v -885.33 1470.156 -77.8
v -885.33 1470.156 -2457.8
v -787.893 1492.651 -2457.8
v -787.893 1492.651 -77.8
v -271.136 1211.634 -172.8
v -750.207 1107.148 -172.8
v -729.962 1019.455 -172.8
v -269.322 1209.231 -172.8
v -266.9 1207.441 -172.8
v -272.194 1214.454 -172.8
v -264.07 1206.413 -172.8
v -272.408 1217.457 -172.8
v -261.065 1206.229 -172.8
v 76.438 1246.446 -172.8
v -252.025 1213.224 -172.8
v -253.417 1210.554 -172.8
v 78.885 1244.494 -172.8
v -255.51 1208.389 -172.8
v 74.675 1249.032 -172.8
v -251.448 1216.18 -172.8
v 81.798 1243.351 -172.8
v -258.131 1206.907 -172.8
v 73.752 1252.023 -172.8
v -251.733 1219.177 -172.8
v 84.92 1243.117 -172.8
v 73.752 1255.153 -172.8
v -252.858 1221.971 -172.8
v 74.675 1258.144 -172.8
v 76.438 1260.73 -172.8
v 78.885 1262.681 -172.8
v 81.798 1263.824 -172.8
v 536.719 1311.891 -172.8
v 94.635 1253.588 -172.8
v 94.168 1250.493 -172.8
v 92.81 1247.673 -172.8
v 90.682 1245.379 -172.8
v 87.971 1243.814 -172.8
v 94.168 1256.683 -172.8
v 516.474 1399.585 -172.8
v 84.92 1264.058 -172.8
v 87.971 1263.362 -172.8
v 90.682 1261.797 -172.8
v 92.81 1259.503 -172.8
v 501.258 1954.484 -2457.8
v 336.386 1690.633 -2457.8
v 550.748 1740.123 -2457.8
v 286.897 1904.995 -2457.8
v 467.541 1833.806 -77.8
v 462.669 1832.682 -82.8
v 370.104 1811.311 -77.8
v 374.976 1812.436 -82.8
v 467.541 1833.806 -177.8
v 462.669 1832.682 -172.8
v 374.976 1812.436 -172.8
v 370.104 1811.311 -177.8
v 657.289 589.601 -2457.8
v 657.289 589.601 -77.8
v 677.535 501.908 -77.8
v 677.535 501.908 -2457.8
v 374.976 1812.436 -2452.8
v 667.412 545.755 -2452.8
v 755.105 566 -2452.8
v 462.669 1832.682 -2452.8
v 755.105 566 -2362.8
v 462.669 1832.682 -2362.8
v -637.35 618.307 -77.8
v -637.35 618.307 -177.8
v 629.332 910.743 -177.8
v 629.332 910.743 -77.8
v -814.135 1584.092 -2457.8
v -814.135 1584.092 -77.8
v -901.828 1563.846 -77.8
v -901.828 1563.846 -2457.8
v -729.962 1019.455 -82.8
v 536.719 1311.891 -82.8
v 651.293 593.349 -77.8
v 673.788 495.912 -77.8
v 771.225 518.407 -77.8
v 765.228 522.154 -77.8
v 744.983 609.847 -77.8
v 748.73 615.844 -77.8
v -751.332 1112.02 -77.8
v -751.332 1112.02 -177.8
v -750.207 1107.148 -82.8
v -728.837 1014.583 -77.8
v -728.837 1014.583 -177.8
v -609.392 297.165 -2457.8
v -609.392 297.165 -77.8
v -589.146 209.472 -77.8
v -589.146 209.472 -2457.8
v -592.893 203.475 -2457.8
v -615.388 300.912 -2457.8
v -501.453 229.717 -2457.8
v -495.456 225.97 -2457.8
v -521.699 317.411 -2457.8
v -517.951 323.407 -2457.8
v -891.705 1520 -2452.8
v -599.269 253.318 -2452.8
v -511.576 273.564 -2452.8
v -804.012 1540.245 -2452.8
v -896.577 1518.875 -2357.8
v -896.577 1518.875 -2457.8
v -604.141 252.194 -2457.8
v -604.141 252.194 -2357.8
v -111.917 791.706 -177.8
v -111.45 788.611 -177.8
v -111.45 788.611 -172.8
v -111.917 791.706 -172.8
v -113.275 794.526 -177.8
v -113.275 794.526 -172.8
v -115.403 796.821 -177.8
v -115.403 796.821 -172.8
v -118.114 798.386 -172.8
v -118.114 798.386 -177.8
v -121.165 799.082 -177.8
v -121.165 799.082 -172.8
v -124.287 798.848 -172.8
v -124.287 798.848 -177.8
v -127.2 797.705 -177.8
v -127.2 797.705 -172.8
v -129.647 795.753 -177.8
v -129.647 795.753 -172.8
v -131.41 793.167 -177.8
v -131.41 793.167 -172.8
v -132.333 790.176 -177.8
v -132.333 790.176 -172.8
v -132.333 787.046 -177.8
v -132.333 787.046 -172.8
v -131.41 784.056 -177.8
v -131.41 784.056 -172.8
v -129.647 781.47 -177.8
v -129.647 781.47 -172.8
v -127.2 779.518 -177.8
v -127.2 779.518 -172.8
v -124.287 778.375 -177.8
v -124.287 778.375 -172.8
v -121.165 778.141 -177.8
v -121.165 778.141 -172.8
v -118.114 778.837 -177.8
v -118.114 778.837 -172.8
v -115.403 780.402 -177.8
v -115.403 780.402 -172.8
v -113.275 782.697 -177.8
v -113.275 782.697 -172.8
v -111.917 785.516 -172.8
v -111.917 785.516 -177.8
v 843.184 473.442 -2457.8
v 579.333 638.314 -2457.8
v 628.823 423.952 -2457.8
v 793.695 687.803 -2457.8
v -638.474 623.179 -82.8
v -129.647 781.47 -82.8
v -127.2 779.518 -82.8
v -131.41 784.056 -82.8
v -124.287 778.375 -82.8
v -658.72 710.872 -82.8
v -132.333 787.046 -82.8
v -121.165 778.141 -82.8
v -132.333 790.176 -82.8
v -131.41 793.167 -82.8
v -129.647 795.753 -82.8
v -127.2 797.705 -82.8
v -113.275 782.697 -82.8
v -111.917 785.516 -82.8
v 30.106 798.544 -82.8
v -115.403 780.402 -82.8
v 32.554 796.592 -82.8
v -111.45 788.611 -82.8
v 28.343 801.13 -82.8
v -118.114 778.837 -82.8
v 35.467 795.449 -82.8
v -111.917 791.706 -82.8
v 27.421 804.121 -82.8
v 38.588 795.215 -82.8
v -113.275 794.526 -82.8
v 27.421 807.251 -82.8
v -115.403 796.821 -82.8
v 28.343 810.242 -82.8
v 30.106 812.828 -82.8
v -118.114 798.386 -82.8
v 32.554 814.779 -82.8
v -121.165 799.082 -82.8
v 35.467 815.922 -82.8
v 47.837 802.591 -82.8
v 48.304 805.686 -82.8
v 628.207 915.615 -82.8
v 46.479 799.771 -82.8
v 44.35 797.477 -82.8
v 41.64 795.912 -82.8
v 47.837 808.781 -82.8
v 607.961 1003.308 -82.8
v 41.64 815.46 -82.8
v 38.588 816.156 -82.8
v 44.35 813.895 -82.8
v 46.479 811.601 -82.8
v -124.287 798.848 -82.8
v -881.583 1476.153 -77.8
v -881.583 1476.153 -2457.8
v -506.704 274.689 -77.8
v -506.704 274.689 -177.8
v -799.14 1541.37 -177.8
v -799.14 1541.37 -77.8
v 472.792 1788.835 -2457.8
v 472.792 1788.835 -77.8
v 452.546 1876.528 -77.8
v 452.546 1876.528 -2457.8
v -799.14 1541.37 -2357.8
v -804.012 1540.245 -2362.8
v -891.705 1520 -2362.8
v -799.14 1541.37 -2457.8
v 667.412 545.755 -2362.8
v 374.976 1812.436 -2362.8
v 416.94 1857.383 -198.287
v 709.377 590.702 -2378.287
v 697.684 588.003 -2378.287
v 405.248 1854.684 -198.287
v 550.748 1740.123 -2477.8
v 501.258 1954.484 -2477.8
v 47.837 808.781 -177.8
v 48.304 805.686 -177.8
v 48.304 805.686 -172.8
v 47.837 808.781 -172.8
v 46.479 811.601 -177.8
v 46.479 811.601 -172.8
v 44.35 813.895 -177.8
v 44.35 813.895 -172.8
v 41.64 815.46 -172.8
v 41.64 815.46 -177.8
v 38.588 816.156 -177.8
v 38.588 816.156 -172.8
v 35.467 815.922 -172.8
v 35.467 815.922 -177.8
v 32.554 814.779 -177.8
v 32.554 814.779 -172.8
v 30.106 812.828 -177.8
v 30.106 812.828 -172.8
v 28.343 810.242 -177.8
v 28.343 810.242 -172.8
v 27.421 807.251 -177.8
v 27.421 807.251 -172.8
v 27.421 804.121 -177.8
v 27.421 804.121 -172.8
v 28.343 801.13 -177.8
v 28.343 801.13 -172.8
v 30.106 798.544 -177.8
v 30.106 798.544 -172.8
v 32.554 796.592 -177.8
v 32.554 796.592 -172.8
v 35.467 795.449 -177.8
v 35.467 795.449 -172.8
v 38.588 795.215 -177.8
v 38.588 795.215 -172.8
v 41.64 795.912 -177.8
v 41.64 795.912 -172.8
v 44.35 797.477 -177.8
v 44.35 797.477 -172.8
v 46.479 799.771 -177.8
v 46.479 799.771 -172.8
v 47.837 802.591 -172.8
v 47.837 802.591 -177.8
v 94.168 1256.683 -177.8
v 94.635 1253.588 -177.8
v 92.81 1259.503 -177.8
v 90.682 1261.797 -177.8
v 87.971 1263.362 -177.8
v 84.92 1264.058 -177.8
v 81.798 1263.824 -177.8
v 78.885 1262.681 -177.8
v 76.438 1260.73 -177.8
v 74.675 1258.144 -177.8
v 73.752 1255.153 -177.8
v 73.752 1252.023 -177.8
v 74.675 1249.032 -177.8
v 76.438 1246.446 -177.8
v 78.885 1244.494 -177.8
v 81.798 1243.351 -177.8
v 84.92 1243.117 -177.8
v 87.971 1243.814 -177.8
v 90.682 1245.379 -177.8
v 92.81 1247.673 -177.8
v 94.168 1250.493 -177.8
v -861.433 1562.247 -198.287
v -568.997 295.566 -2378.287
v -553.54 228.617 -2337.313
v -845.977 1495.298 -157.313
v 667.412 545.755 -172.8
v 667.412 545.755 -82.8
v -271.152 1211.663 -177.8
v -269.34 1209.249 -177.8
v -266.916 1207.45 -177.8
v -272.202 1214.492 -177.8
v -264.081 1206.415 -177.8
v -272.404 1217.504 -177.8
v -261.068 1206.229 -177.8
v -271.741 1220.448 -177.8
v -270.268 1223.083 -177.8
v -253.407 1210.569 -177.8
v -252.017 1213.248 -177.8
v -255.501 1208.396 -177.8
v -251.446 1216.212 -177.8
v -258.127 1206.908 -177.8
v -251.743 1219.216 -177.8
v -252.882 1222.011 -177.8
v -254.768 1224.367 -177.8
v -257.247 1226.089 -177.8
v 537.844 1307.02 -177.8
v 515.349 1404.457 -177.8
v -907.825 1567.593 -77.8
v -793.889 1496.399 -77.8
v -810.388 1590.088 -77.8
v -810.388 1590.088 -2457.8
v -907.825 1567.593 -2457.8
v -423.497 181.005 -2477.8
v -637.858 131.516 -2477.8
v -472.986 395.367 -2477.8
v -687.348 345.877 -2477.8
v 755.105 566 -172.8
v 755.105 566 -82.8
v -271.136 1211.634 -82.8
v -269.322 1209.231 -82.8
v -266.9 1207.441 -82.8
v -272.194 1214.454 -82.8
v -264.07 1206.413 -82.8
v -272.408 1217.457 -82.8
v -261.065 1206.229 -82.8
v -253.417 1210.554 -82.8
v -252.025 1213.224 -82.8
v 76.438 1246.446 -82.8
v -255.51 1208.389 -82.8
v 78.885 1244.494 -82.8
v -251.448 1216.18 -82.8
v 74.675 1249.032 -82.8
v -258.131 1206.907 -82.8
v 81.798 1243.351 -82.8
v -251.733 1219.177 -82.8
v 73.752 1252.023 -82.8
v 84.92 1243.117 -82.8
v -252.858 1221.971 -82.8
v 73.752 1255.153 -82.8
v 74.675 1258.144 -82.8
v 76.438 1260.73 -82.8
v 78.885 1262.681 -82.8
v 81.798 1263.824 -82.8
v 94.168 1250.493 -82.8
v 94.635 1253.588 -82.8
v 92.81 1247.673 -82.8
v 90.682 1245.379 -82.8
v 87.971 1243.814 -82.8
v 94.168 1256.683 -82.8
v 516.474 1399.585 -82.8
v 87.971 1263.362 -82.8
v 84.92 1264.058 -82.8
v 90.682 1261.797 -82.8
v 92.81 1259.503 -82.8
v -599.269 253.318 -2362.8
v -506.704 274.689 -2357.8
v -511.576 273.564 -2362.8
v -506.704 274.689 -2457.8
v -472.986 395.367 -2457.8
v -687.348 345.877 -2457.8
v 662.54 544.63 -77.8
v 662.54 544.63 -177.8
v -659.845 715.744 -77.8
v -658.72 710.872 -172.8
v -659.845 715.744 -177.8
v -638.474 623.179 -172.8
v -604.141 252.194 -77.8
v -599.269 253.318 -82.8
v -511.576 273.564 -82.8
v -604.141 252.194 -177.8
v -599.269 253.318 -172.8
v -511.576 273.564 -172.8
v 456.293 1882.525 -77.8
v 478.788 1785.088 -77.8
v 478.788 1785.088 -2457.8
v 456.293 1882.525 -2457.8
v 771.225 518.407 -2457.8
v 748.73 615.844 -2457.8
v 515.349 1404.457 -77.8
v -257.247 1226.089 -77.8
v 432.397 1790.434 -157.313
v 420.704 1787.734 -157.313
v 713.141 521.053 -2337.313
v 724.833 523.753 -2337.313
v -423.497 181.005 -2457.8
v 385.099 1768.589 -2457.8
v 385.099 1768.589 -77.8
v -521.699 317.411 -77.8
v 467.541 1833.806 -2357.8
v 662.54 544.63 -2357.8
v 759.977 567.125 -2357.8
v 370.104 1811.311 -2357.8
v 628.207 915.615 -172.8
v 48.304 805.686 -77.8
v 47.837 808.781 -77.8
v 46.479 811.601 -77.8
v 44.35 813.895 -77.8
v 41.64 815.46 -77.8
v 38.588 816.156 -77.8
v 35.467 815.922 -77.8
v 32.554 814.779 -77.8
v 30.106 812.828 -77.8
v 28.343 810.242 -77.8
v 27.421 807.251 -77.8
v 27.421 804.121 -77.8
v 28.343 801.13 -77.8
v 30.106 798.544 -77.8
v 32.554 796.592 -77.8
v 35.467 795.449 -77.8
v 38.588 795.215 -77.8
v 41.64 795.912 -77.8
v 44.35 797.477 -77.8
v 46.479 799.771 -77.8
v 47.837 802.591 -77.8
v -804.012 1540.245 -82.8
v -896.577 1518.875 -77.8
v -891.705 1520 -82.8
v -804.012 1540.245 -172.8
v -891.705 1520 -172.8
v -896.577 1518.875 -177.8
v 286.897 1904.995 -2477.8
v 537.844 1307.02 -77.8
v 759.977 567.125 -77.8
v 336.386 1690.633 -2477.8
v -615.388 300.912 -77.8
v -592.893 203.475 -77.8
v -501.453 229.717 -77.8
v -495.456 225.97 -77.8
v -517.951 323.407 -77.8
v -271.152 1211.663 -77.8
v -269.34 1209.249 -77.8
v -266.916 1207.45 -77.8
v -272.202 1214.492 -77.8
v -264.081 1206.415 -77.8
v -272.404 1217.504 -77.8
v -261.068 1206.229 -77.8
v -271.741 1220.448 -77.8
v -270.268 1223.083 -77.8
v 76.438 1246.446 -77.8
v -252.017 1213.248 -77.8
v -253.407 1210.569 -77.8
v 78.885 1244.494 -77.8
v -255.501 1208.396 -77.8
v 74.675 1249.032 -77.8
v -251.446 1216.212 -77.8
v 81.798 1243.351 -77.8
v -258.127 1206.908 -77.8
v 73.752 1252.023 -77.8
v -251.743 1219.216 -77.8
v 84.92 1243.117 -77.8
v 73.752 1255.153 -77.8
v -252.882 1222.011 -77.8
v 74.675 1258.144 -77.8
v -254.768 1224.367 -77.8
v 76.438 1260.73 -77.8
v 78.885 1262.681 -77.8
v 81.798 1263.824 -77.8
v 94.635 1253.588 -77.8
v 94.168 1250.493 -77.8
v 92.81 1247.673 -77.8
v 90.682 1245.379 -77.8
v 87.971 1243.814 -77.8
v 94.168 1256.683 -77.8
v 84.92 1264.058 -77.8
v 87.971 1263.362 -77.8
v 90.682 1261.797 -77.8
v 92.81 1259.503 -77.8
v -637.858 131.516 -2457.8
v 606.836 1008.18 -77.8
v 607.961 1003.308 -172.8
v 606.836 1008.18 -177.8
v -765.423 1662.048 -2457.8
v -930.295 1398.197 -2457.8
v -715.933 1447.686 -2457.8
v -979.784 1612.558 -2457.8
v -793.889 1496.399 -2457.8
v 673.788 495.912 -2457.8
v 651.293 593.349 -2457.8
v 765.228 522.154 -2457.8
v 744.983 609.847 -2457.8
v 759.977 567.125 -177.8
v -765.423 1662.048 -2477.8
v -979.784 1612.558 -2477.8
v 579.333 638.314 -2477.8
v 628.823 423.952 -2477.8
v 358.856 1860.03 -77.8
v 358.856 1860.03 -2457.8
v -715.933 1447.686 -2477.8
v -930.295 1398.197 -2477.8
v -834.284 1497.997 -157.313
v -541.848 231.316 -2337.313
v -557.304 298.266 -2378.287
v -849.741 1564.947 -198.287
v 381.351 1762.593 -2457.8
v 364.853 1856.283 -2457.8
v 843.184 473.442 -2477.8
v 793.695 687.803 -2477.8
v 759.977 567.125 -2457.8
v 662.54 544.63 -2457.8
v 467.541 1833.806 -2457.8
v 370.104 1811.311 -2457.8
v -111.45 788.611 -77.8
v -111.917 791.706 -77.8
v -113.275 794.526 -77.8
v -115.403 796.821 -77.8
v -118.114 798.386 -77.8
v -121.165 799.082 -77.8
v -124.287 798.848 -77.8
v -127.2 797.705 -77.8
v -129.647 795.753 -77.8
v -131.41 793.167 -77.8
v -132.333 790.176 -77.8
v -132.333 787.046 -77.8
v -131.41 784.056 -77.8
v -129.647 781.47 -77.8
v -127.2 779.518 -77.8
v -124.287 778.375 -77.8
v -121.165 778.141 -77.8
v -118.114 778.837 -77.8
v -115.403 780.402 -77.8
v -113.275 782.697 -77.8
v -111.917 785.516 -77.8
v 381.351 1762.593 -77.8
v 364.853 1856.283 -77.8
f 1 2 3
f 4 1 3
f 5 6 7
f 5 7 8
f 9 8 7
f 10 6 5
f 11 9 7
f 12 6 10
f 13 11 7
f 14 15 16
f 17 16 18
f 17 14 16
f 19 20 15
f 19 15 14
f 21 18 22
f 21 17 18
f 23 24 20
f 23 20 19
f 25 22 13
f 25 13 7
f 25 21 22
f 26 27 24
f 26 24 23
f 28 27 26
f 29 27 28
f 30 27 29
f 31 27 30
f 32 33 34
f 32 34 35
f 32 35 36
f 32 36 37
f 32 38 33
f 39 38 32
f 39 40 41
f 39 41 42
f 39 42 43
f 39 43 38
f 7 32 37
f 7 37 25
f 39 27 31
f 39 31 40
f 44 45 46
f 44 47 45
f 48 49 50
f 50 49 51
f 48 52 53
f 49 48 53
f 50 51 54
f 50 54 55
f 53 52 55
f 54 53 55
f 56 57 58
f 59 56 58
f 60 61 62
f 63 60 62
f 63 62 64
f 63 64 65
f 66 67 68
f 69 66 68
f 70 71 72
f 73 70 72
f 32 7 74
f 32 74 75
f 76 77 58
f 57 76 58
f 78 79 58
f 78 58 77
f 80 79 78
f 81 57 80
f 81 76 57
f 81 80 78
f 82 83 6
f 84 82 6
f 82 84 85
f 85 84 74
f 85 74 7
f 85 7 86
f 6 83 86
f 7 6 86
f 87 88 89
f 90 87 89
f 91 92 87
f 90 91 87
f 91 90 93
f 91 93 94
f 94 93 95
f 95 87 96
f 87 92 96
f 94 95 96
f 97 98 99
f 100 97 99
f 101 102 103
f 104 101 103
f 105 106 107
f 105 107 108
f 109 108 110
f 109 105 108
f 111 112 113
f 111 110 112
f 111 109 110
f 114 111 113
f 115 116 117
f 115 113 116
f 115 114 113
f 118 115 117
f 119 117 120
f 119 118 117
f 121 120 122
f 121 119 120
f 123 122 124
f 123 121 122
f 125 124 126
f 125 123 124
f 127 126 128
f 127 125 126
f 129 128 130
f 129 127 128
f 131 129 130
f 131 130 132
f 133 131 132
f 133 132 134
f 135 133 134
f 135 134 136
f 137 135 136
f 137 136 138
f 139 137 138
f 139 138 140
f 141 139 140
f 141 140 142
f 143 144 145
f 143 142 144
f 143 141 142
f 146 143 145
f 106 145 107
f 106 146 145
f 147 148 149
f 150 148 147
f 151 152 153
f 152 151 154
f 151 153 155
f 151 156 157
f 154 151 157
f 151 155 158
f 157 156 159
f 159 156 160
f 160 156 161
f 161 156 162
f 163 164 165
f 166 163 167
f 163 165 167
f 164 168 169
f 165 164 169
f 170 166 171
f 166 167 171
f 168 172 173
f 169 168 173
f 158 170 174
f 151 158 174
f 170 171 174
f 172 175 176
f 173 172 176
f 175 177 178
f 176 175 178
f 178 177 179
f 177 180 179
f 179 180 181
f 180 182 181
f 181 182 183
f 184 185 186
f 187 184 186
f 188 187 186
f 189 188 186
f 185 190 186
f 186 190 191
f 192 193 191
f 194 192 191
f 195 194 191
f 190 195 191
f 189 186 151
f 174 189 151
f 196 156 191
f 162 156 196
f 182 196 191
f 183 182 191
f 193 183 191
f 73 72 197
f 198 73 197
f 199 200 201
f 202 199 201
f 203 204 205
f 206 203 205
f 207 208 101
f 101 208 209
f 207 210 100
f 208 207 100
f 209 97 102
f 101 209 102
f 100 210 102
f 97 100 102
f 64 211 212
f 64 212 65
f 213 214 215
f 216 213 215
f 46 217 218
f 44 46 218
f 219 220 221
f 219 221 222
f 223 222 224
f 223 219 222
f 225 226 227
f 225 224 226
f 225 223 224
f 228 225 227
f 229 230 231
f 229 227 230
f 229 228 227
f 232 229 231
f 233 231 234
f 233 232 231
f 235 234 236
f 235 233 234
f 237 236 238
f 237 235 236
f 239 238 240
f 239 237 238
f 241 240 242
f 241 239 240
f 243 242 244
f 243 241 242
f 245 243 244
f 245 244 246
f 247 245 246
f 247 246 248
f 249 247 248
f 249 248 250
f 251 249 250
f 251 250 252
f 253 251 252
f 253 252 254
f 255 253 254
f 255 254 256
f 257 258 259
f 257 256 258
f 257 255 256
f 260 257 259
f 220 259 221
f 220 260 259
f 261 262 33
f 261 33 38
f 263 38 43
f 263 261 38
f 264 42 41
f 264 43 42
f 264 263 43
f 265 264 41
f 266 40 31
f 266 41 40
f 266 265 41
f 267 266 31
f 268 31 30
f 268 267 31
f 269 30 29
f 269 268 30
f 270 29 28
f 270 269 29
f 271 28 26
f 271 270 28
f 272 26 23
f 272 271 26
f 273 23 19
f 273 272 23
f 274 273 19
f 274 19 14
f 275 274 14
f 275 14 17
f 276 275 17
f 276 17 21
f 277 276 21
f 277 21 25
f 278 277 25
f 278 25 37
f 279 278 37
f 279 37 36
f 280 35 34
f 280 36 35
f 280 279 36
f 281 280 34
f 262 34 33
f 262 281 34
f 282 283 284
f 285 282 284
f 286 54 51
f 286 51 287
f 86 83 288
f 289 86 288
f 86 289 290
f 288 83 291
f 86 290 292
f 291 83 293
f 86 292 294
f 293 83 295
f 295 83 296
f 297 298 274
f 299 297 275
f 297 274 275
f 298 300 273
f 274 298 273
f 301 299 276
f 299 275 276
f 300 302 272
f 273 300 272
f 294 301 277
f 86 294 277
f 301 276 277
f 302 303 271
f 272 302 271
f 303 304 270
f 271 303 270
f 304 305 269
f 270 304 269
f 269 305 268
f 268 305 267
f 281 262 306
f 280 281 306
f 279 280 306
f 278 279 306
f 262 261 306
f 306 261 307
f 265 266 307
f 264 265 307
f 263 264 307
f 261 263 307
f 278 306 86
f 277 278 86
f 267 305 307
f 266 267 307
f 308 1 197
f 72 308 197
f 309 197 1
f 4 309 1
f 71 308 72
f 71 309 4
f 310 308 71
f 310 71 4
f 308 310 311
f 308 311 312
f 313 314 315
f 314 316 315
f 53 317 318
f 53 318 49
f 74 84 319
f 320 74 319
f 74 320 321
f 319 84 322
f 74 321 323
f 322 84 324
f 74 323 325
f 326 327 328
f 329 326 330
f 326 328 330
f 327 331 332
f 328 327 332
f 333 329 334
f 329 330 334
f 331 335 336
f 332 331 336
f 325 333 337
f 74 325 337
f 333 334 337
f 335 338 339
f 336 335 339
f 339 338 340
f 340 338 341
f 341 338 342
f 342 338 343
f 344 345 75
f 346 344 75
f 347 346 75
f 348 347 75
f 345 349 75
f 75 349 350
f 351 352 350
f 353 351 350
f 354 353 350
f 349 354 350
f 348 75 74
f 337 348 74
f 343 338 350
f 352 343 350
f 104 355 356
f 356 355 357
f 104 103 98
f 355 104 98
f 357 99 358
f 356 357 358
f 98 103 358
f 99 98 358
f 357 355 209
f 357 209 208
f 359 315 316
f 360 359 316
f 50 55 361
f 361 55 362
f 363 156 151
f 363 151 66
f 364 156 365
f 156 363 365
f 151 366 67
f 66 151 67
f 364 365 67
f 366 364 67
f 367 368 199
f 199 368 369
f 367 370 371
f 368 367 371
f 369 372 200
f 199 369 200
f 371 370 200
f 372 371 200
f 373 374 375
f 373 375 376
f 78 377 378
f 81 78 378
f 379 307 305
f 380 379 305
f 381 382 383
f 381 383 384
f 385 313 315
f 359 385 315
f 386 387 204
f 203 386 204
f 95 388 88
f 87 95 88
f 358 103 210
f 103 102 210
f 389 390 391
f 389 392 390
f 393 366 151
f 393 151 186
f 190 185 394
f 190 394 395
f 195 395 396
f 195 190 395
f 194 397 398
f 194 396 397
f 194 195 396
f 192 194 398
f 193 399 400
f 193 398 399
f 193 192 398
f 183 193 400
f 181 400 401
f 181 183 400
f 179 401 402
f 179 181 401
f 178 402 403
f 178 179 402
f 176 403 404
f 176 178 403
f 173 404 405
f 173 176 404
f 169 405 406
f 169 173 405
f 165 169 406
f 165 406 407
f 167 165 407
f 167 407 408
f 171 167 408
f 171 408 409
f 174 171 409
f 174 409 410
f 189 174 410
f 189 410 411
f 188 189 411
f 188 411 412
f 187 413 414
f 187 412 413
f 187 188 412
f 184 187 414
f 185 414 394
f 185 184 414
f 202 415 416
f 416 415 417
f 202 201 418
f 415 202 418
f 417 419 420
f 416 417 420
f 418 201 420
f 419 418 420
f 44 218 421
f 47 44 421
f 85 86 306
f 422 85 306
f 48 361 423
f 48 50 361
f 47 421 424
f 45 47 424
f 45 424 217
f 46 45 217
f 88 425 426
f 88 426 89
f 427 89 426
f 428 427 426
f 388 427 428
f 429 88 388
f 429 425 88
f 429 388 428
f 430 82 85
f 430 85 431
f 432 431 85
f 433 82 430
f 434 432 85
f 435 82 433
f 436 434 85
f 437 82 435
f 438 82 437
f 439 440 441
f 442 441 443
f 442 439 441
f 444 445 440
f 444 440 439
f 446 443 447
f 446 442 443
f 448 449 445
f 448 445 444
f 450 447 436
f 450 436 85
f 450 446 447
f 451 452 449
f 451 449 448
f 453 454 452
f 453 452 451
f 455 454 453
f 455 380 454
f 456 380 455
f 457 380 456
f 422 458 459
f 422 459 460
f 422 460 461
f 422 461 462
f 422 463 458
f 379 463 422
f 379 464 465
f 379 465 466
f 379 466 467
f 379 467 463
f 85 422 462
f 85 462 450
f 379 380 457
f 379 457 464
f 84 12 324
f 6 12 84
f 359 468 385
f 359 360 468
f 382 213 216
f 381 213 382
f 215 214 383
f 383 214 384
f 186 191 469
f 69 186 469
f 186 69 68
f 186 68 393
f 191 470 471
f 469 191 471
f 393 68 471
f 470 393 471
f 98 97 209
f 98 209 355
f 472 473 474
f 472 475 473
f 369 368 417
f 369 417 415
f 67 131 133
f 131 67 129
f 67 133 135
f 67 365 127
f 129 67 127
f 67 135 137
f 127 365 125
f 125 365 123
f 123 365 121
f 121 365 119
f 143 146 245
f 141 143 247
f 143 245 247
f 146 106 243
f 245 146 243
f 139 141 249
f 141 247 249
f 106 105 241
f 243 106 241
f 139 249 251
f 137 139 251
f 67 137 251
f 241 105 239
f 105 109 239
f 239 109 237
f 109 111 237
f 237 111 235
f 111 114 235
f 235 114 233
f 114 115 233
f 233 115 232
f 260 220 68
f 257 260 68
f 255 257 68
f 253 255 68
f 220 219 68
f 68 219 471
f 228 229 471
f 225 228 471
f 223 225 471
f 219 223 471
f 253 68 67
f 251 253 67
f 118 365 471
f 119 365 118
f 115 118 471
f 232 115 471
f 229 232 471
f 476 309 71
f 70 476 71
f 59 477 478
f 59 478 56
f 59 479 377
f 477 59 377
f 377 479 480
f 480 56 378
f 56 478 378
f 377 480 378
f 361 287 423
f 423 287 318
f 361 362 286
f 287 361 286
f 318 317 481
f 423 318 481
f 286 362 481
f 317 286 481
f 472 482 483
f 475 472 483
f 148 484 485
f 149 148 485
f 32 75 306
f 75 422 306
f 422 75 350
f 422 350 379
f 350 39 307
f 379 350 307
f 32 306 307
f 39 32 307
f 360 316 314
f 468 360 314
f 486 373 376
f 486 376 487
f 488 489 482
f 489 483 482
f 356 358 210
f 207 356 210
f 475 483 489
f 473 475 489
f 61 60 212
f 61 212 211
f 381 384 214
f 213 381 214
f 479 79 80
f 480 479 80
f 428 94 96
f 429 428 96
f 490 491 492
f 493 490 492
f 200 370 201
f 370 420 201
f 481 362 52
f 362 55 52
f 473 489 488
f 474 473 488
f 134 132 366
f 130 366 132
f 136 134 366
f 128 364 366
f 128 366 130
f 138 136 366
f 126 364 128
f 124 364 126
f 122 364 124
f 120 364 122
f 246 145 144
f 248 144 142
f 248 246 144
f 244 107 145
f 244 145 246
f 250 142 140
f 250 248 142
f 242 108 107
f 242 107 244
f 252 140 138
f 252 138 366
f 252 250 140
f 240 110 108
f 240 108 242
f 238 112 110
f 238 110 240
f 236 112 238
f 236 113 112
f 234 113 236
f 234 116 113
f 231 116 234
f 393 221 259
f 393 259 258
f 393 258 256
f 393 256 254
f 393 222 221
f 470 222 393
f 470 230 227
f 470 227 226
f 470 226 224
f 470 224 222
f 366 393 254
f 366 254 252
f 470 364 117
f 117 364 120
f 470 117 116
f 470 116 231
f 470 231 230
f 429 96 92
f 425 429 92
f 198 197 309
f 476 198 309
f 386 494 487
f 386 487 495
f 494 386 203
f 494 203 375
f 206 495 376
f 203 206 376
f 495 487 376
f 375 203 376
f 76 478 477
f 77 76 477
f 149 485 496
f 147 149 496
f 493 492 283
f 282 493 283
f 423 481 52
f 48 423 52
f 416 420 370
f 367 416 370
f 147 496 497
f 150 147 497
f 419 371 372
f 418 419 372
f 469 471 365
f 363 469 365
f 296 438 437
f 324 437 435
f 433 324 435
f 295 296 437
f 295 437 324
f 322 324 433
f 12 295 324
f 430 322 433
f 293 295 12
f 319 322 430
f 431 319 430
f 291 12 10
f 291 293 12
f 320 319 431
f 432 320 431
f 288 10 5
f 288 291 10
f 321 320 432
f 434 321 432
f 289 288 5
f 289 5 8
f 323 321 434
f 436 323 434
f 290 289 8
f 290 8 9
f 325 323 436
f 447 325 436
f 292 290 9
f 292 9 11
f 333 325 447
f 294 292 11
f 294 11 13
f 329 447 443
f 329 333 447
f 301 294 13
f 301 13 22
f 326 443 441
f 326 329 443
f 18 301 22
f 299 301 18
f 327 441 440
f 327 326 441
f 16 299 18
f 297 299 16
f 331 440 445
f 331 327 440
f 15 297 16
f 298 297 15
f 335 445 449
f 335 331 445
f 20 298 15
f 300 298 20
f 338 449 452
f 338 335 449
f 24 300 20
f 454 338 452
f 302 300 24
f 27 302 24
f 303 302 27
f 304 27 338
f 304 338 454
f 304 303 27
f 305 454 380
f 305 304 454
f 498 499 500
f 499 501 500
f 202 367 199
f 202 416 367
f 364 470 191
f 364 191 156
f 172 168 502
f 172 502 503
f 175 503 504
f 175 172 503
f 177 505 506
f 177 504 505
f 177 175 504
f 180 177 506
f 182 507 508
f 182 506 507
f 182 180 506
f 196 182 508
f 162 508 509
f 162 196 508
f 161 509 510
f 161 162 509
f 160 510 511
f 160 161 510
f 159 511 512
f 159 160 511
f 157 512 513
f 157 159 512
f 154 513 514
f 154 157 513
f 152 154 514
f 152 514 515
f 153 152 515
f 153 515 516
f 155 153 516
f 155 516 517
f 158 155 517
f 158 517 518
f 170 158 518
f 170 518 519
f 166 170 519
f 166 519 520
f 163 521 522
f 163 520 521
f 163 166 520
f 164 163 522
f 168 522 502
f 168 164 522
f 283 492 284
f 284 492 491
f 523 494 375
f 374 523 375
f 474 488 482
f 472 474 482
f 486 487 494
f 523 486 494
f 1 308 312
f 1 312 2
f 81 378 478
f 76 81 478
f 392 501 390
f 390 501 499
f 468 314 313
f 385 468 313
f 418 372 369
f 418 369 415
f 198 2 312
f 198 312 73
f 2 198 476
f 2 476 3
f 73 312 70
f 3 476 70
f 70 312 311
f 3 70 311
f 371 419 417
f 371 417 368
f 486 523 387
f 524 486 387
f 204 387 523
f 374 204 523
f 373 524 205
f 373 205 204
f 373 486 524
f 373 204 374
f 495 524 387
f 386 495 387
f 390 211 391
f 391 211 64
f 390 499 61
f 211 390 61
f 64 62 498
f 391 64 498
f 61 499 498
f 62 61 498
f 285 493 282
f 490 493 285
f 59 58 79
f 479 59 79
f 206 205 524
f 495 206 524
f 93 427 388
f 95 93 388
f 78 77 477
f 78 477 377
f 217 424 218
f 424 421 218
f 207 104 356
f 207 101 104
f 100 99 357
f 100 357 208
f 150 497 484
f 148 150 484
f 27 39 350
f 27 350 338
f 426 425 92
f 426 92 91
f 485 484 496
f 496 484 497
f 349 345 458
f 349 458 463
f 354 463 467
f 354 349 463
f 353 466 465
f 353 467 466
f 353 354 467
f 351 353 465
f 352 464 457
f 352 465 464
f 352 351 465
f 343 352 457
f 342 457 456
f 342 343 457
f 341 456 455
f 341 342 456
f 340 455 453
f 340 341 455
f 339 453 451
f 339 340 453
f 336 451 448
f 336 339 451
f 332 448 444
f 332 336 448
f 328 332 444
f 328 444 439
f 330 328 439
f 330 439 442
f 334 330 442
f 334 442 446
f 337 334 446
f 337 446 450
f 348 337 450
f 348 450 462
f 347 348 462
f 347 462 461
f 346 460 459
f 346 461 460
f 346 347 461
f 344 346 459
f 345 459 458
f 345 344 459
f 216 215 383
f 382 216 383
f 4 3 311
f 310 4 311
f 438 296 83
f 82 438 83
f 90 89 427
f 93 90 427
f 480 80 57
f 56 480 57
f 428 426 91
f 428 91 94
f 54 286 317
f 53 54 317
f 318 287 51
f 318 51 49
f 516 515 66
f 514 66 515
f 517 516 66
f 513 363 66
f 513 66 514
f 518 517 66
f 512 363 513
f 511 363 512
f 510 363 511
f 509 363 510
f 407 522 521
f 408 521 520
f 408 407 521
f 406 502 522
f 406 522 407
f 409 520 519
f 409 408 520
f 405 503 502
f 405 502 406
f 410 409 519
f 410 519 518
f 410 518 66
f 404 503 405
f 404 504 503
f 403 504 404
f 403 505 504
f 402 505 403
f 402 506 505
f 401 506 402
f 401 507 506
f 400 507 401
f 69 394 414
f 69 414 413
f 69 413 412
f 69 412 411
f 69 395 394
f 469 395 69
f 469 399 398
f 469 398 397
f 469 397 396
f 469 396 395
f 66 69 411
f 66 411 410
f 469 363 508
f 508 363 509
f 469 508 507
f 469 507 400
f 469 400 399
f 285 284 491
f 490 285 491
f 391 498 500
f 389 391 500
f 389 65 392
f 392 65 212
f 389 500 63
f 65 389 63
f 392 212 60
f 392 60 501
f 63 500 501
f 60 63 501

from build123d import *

# Parameters (mm, degrees)
BOSS_EXTRUDE1_START  = -2457.8
BOSS_EXTRUDE1_DEPTH  = 2380
BOSS_EXTRUDE2_START  = -2457.8
BOSS_EXTRUDE2_DEPTH  = 2380
BOSS_EXTRUDE3_START  = -2457.8
BOSS_EXTRUDE3_DEPTH  = 2380
BOSS_EXTRUDE4_START  = -2457.8
BOSS_EXTRUDE4_DEPTH  = 2380
BOSS_EXTRUDE5_START  = -2477.8
BOSS_EXTRUDE5_DEPTH  = 20
BOSS_EXTRUDE6_START  = -2477.8
BOSS_EXTRUDE6_DEPTH  = 20
BOSS_EXTRUDE7_START  = -2477.8
BOSS_EXTRUDE7_DEPTH  = 20
BOSS_EXTRUDE8_START  = -2477.8
BOSS_EXTRUDE8_DEPTH  = 20
BOSS_EXTRUDE9_START  = -177.8
BOSS_EXTRUDE9_DEPTH  = 100
BOSS_EXTRUDE10_START = -172.8
BOSS_EXTRUDE10_DEPTH = 90
BOSS_EXTRUDE11_START = -177.8
BOSS_EXTRUDE11_DEPTH = 100
BOSS_EXTRUDE12_START = -172.8
BOSS_EXTRUDE12_DEPTH = 90
BOSS_EXTRUDE13_START = -2457.8
BOSS_EXTRUDE13_DEPTH = 100
BOSS_EXTRUDE14_START = -2452.8
BOSS_EXTRUDE14_DEPTH = 90
BOSS_EXTRUDE15_START = -2457.8
BOSS_EXTRUDE15_DEPTH = 100
BOSS_EXTRUDE16_START = -2452.8
BOSS_EXTRUDE16_DEPTH = 90
BOSS_EXTRUDE17_START = -177.8
BOSS_EXTRUDE17_DEPTH = 100
BOSS_EXTRUDE18_START = -172.8
BOSS_EXTRUDE18_DEPTH = 90
BOSS_EXTRUDE19_START = -177.8
BOSS_EXTRUDE19_DEPTH = 100
BOSS_EXTRUDE20_START = -172.8
BOSS_EXTRUDE20_DEPTH = 90
BOSS_EXTRUDE21_START = -182.8
SKETCH21_R           = 10.5
BOSS_EXTRUDE21_DEPTH = 110
BOSS_EXTRUDE22_START = -182.8
SKETCH22_R           = 10.5
BOSS_EXTRUDE22_DEPTH = 110
BOSS_EXTRUDE23_START = -182.8
SKETCH23_R           = 10.5
BOSS_EXTRUDE23_DEPTH = 110
BOSS_EXTRUDE24_START = -182.8
SKETCH24_R           = 10.5
BOSS_EXTRUDE24_DEPTH = 110
BOSS_EXTRUDE25_DEPTH = 2538.188330286
BOSS_EXTRUDE26_DEPTH = 2538.188330286


with BuildPart() as part:
    # Sketch1 → Boss-Extrude1 (new body)
    with BuildSketch(Plane.XY.offset(BOSS_EXTRUDE1_START)):
        Polygon((381.351406265, 1762.592671477), (478.788412743, 1785.087776912), (456.293307309, 1882.52478339), (358.85630083, 1860.029677956), align=None)
        Polygon((385.098501317, 1768.589277073), (472.791807148, 1788.834871964), (452.546212257, 1876.528177795), (364.852906426, 1856.282582904), align=None, mode=Mode.SUBTRACT)
    extrude(amount=BOSS_EXTRUDE1_DEPTH)


with BuildPart() as body_2:
    # Sketch2 → Boss-Extrude2 (new body)
    with BuildSketch(Plane.XY.offset(BOSS_EXTRUDE2_START)):
        Polygon((673.787776912, 495.911587257), (771.22478339, 518.406692691), (748.729677956, 615.84369917), (651.292671477, 593.348593735), align=None)
        Polygon((677.534871964, 501.908192852), (765.228177795, 522.153787743), (744.982582904, 609.847093574), (657.289277073, 589.601498683), align=None, mode=Mode.SUBTRACT)
    extrude(amount=BOSS_EXTRUDE2_DEPTH)


with BuildPart() as body_3:
    # Sketch3 → Boss-Extrude3 (new body)
    with BuildSketch(Plane.XY.offset(BOSS_EXTRUDE3_START)):
        Polygon((-885.329677956, 1470.15630083), (-787.892671477, 1492.651406265), (-810.387776912, 1590.088412743), (-907.82478339, 1567.593307309), align=None)
        Polygon((-881.582582904, 1476.152906426), (-793.889277073, 1496.398501317), (-814.134871964, 1584.091807148), (-901.828177795, 1563.846212257), align=None, mode=Mode.SUBTRACT)
    extrude(amount=BOSS_EXTRUDE3_DEPTH)


with BuildPart() as body_4:
    # Sketch4 → Boss-Extrude4 (new body)
    with BuildSketch(Plane.XY.offset(BOSS_EXTRUDE4_START)):
        Polygon((-592.893307309, 203.47521661), (-495.45630083, 225.970322044), (-517.951406265, 323.407328523), (-615.388412743, 300.912223088), align=None)
        Polygon((-589.146212257, 209.471822205), (-501.452906426, 229.717417096), (-521.698501317, 317.410722927), (-609.391807148, 297.165128036), align=None, mode=Mode.SUBTRACT)
    extrude(amount=BOSS_EXTRUDE4_DEPTH)


with BuildPart() as body_5:
    # Sketch5 → Boss-Extrude5 (new body)
    with BuildSketch(Plane.XY.offset(BOSS_EXTRUDE5_START)):
        Polygon((336.386265638, 1690.63340433), (550.747679891, 1740.122636285), (501.258447935, 1954.484050538), (286.897033683, 1904.994818582), align=None)
    extrude(amount=BOSS_EXTRUDE5_DEPTH)


with BuildPart() as body_6:
    # Sketch6 → Boss-Extrude6 (new body)
    with BuildSketch(Plane.XY.offset(BOSS_EXTRUDE6_START)):
        Polygon((628.822636285, 423.952320109), (843.184050538, 473.441552065), (793.694818582, 687.802966317), (579.33340433, 638.313734362), align=None)
    extrude(amount=BOSS_EXTRUDE6_DEPTH)


with BuildPart() as body_7:
    # Sketch7 → Boss-Extrude7 (new body)
    with BuildSketch(Plane.XY.offset(BOSS_EXTRUDE7_START)):
        Polygon((-930.294818582, 1398.197033683), (-715.93340433, 1447.686265638), (-765.422636285, 1662.047679891), (-979.784050538, 1612.558447935), align=None)
    extrude(amount=BOSS_EXTRUDE7_DEPTH)


with BuildPart() as body_8:
    # Sketch8 → Boss-Extrude8 (new body)
    with BuildSketch(Plane.XY.offset(BOSS_EXTRUDE8_START)):
        Polygon((-637.858447935, 131.515949462), (-423.497033683, 181.005181418), (-472.986265638, 395.36659567), (-687.347679891, 345.877363715), align=None)
    extrude(amount=BOSS_EXTRUDE8_DEPTH)


with BuildPart() as body_9:
    # Sketch9 → Boss-Extrude9 (new body)
    with BuildSketch(Plane.XY.offset(BOSS_EXTRUDE9_START)):
        Polygon((662.540224195, 544.630090496), (759.977230673, 567.12519593), (467.540860026, 1833.806280151), (370.103853548, 1811.311174717), align=None)
    extrude(amount=BOSS_EXTRUDE9_DEPTH)


with BuildPart() as body_10:
    # Sketch10 → Boss-Extrude10 (new body)
    with BuildSketch(Plane.XY.offset(BOSS_EXTRUDE10_START)):
        Polygon((667.412074519, 545.754845768), (755.105380349, 566.000440659), (462.669009702, 1832.681524879), (374.975703872, 1812.435929988), align=None)
    extrude(amount=BOSS_EXTRUDE10_DEPTH)


with BuildPart() as body_9_1:
    add(body_9.part)

    # Combine1: cut body 10
    add(body_10.part, mode=Mode.SUBTRACT)


with BuildPart() as body_10_2:
    # Sketch11 → Boss-Extrude11 (new body)
    with BuildSketch(Plane.XY.offset(BOSS_EXTRUDE11_START)):
        Polygon((-604.140860026, 252.193719849), (-506.703853548, 274.688825283), (-799.140224195, 1541.369909504), (-896.577230673, 1518.87480407), align=None)
    extrude(amount=BOSS_EXTRUDE11_DEPTH)


with BuildPart() as body_11:
    # Sketch12 → Boss-Extrude12 (new body)
    with BuildSketch(Plane.XY.offset(BOSS_EXTRUDE12_START)):
        Polygon((-599.269009702, 253.318475121), (-511.575703872, 273.564070012), (-804.012074519, 1540.245154232), (-891.705380349, 1519.999559341), align=None)
    extrude(amount=BOSS_EXTRUDE12_DEPTH)


with BuildPart() as body_10_2_1:
    add(body_10_2.part)

    # Combine2: cut body 11
    add(body_11.part, mode=Mode.SUBTRACT)


with BuildPart() as body_11_2:
    # Sketch13 → Boss-Extrude13 (new body)
    with BuildSketch(Plane.XY.offset(BOSS_EXTRUDE13_START)):
        Polygon((662.540224195, 544.630090496), (759.977230673, 567.12519593), (467.540860026, 1833.806280151), (370.103853548, 1811.311174717), align=None)
    extrude(amount=BOSS_EXTRUDE13_DEPTH)


with BuildPart() as body_12:
    # Sketch14 → Boss-Extrude14 (new body)
    with BuildSketch(Plane.XY.offset(BOSS_EXTRUDE14_START)):
        Polygon((667.412074519, 545.754845768), (755.105380349, 566.000440659), (462.669009702, 1832.681524879), (374.975703872, 1812.435929988), align=None)
    extrude(amount=BOSS_EXTRUDE14_DEPTH)


with BuildPart() as body_11_2_1:
    add(body_11_2.part)

    # Combine3: cut body 12
    add(body_12.part, mode=Mode.SUBTRACT)


with BuildPart() as body_12_2:
    # Sketch15 → Boss-Extrude15 (new body)
    with BuildSketch(Plane.XY.offset(BOSS_EXTRUDE15_START)):
        Polygon((-604.140860026, 252.193719849), (-506.703853548, 274.688825283), (-799.140224195, 1541.369909504), (-896.577230673, 1518.87480407), align=None)
    extrude(amount=BOSS_EXTRUDE15_DEPTH)


with BuildPart() as body_13:
    # Sketch16 → Boss-Extrude16 (new body)
    with BuildSketch(Plane.XY.offset(BOSS_EXTRUDE16_START)):
        Polygon((-599.269009702, 253.318475121), (-511.575703872, 273.564070012), (-804.012074519, 1540.245154232), (-891.705380349, 1519.999559341), align=None)
    extrude(amount=BOSS_EXTRUDE16_DEPTH)


with BuildPart() as body_12_2_1:
    add(body_12_2.part)

    # Combine4: cut body 13
    add(body_13.part, mode=Mode.SUBTRACT)


with BuildPart() as body_13_2:
    # Sketch17 → Boss-Extrude17 (new body)
    with BuildSketch(Plane.XY.offset(BOSS_EXTRUDE17_START)):
        Polygon((-637.349530779, 618.306850161), (629.331553442, 910.743220808), (606.836448007, 1008.180227286), (-659.844636213, 715.743856639), align=None)
    extrude(amount=BOSS_EXTRUDE17_DEPTH)


with BuildPart() as body_14:
    # Sketch18 → Boss-Extrude18 (new body)
    with BuildSketch(Plane.XY.offset(BOSS_EXTRUDE18_START)):
        Polygon((-638.474286051, 623.178700485), (628.20679817, 915.615071132), (607.961203279, 1003.308376962), (-658.719880942, 710.872006315), align=None)
    extrude(amount=BOSS_EXTRUDE18_DEPTH)


with BuildPart() as body_13_2_1:
    add(body_13_2.part)

    # Combine5: cut body 14
    add(body_14.part, mode=Mode.SUBTRACT)


with BuildPart() as body_14_2:
    # Sketch19 → Boss-Extrude19 (new body)
    with BuildSketch(Plane.XY.offset(BOSS_EXTRUDE19_START)):
        Polygon((-728.837124581, 1014.583155509), (537.84395964, 1307.019526156), (515.348854206, 1404.456532635), (-751.332230015, 1112.020161988), align=None)
    extrude(amount=BOSS_EXTRUDE19_DEPTH)


with BuildPart() as body_15:
    # Sketch20 → Boss-Extrude20 (new body)
    with BuildSketch(Plane.XY.offset(BOSS_EXTRUDE20_START)):
        Polygon((-729.961879852, 1019.455005833), (536.719204369, 1311.89137648), (516.473609478, 1399.584682311), (-750.207474743, 1107.148311664), align=None)
    extrude(amount=BOSS_EXTRUDE20_DEPTH)


with BuildPart() as body_14_2_1:
    add(body_14_2.part)

    # Combine6: cut body 15
    add(body_15.part, mode=Mode.SUBTRACT)


with BuildPart() as body_15_2:
    # Sketch21 → Boss-Extrude21 (new body)
    with BuildSketch(Plane.XY.offset(BOSS_EXTRUDE21_START)):
        with Locations((-121.95006348, 788.611398273)):
            Circle(SKETCH21_R)
    extrude(amount=BOSS_EXTRUDE21_DEPTH)


with BuildPart() as body_13_2_2:
    add(body_13_2_1.part)

    # Combine7: cut body 15 2
    add(body_15_2.part, mode=Mode.SUBTRACT)


with BuildPart() as body_15_3:
    # Sketch22 → Boss-Extrude22 (new body)
    with BuildSketch(Plane.XY.offset(BOSS_EXTRUDE22_START)):
        with Locations((37.803517202, 805.68574919)):
            Circle(SKETCH22_R)
    extrude(amount=BOSS_EXTRUDE22_DEPTH)


with BuildPart() as body_13_2_3:
    add(body_13_2_2.part)

    # Combine8: cut body 15 3
    add(body_15_3.part, mode=Mode.SUBTRACT)


with BuildPart() as body_15_4:
    # Sketch23 → Boss-Extrude23 (new body)
    with BuildSketch(Plane.XY.offset(BOSS_EXTRUDE23_START)):
        with Locations((84.134960504, 1253.587755618)):
            Circle(SKETCH23_R)
    extrude(amount=BOSS_EXTRUDE23_DEPTH)


with BuildPart() as body_14_2_2:
    add(body_14_2_1.part)

    # Combine9: cut body 15 4
    add(body_15_4.part, mode=Mode.SUBTRACT)


with BuildPart() as body_15_5:
    # Sketch24 → Boss-Extrude24 (new body)
    with BuildSketch(Plane.XY.offset(BOSS_EXTRUDE24_START)):
        with Locations((-261.935346056, 1216.693272056)):
            Circle(SKETCH24_R)
    extrude(amount=BOSS_EXTRUDE24_DEPTH)


with BuildPart() as body_14_2_3:
    add(body_14_2_2.part)

    # Combine10: cut body 15 5
    add(body_15_5.part, mode=Mode.SUBTRACT)


with BuildPart() as body_15_6:
    # 3DSketch1 → Boss-Extrude25 (new body)
    with BuildSketch(Plane(origin=(697.684265723, 588.002627727, -2378.287053454), x_dir=(0.33560696642461146, -0.7942391255218068, 0.5065097981062415), z_dir=(-0.11521460687436719, 0.49904929004148274, 0.8588803178975969))):
        Polygon((0, 0), (79.114908229, -11.867236234), (80.894993665, 0), (1.780085435, 11.867236234), align=None)
    extrude(amount=BOSS_EXTRUDE25_DEPTH)


with BuildPart() as body_16:
    # 3DSketch3 → Boss-Extrude26 (new body)
    with BuildSketch(Plane(origin=(-568.996818498, 295.56625708, -2378.287053454), x_dir=(0.3356069664246124, -0.7942391255218055, 0.506509798106243), z_dir=(-0.11521460687437408, 0.49904929004148185, 0.8588803178975966))):
        Polygon((0, 0), (79.114908229, -11.867236234), (80.894993665, 0), (1.780085435, 11.867236234), align=None)
    extrude(amount=BOSS_EXTRUDE26_DEPTH)


solid = Compound([part.part, body_2.part, body_3.part, body_4.part, body_5.part, body_6.part, body_7.part, body_8.part, body_9_1.part, body_10_2_1.part, body_11_2_1.part, body_12_2_1.part, body_13_2_3.part, body_14_2_3.part, body_15_6.part, body_16.part])
